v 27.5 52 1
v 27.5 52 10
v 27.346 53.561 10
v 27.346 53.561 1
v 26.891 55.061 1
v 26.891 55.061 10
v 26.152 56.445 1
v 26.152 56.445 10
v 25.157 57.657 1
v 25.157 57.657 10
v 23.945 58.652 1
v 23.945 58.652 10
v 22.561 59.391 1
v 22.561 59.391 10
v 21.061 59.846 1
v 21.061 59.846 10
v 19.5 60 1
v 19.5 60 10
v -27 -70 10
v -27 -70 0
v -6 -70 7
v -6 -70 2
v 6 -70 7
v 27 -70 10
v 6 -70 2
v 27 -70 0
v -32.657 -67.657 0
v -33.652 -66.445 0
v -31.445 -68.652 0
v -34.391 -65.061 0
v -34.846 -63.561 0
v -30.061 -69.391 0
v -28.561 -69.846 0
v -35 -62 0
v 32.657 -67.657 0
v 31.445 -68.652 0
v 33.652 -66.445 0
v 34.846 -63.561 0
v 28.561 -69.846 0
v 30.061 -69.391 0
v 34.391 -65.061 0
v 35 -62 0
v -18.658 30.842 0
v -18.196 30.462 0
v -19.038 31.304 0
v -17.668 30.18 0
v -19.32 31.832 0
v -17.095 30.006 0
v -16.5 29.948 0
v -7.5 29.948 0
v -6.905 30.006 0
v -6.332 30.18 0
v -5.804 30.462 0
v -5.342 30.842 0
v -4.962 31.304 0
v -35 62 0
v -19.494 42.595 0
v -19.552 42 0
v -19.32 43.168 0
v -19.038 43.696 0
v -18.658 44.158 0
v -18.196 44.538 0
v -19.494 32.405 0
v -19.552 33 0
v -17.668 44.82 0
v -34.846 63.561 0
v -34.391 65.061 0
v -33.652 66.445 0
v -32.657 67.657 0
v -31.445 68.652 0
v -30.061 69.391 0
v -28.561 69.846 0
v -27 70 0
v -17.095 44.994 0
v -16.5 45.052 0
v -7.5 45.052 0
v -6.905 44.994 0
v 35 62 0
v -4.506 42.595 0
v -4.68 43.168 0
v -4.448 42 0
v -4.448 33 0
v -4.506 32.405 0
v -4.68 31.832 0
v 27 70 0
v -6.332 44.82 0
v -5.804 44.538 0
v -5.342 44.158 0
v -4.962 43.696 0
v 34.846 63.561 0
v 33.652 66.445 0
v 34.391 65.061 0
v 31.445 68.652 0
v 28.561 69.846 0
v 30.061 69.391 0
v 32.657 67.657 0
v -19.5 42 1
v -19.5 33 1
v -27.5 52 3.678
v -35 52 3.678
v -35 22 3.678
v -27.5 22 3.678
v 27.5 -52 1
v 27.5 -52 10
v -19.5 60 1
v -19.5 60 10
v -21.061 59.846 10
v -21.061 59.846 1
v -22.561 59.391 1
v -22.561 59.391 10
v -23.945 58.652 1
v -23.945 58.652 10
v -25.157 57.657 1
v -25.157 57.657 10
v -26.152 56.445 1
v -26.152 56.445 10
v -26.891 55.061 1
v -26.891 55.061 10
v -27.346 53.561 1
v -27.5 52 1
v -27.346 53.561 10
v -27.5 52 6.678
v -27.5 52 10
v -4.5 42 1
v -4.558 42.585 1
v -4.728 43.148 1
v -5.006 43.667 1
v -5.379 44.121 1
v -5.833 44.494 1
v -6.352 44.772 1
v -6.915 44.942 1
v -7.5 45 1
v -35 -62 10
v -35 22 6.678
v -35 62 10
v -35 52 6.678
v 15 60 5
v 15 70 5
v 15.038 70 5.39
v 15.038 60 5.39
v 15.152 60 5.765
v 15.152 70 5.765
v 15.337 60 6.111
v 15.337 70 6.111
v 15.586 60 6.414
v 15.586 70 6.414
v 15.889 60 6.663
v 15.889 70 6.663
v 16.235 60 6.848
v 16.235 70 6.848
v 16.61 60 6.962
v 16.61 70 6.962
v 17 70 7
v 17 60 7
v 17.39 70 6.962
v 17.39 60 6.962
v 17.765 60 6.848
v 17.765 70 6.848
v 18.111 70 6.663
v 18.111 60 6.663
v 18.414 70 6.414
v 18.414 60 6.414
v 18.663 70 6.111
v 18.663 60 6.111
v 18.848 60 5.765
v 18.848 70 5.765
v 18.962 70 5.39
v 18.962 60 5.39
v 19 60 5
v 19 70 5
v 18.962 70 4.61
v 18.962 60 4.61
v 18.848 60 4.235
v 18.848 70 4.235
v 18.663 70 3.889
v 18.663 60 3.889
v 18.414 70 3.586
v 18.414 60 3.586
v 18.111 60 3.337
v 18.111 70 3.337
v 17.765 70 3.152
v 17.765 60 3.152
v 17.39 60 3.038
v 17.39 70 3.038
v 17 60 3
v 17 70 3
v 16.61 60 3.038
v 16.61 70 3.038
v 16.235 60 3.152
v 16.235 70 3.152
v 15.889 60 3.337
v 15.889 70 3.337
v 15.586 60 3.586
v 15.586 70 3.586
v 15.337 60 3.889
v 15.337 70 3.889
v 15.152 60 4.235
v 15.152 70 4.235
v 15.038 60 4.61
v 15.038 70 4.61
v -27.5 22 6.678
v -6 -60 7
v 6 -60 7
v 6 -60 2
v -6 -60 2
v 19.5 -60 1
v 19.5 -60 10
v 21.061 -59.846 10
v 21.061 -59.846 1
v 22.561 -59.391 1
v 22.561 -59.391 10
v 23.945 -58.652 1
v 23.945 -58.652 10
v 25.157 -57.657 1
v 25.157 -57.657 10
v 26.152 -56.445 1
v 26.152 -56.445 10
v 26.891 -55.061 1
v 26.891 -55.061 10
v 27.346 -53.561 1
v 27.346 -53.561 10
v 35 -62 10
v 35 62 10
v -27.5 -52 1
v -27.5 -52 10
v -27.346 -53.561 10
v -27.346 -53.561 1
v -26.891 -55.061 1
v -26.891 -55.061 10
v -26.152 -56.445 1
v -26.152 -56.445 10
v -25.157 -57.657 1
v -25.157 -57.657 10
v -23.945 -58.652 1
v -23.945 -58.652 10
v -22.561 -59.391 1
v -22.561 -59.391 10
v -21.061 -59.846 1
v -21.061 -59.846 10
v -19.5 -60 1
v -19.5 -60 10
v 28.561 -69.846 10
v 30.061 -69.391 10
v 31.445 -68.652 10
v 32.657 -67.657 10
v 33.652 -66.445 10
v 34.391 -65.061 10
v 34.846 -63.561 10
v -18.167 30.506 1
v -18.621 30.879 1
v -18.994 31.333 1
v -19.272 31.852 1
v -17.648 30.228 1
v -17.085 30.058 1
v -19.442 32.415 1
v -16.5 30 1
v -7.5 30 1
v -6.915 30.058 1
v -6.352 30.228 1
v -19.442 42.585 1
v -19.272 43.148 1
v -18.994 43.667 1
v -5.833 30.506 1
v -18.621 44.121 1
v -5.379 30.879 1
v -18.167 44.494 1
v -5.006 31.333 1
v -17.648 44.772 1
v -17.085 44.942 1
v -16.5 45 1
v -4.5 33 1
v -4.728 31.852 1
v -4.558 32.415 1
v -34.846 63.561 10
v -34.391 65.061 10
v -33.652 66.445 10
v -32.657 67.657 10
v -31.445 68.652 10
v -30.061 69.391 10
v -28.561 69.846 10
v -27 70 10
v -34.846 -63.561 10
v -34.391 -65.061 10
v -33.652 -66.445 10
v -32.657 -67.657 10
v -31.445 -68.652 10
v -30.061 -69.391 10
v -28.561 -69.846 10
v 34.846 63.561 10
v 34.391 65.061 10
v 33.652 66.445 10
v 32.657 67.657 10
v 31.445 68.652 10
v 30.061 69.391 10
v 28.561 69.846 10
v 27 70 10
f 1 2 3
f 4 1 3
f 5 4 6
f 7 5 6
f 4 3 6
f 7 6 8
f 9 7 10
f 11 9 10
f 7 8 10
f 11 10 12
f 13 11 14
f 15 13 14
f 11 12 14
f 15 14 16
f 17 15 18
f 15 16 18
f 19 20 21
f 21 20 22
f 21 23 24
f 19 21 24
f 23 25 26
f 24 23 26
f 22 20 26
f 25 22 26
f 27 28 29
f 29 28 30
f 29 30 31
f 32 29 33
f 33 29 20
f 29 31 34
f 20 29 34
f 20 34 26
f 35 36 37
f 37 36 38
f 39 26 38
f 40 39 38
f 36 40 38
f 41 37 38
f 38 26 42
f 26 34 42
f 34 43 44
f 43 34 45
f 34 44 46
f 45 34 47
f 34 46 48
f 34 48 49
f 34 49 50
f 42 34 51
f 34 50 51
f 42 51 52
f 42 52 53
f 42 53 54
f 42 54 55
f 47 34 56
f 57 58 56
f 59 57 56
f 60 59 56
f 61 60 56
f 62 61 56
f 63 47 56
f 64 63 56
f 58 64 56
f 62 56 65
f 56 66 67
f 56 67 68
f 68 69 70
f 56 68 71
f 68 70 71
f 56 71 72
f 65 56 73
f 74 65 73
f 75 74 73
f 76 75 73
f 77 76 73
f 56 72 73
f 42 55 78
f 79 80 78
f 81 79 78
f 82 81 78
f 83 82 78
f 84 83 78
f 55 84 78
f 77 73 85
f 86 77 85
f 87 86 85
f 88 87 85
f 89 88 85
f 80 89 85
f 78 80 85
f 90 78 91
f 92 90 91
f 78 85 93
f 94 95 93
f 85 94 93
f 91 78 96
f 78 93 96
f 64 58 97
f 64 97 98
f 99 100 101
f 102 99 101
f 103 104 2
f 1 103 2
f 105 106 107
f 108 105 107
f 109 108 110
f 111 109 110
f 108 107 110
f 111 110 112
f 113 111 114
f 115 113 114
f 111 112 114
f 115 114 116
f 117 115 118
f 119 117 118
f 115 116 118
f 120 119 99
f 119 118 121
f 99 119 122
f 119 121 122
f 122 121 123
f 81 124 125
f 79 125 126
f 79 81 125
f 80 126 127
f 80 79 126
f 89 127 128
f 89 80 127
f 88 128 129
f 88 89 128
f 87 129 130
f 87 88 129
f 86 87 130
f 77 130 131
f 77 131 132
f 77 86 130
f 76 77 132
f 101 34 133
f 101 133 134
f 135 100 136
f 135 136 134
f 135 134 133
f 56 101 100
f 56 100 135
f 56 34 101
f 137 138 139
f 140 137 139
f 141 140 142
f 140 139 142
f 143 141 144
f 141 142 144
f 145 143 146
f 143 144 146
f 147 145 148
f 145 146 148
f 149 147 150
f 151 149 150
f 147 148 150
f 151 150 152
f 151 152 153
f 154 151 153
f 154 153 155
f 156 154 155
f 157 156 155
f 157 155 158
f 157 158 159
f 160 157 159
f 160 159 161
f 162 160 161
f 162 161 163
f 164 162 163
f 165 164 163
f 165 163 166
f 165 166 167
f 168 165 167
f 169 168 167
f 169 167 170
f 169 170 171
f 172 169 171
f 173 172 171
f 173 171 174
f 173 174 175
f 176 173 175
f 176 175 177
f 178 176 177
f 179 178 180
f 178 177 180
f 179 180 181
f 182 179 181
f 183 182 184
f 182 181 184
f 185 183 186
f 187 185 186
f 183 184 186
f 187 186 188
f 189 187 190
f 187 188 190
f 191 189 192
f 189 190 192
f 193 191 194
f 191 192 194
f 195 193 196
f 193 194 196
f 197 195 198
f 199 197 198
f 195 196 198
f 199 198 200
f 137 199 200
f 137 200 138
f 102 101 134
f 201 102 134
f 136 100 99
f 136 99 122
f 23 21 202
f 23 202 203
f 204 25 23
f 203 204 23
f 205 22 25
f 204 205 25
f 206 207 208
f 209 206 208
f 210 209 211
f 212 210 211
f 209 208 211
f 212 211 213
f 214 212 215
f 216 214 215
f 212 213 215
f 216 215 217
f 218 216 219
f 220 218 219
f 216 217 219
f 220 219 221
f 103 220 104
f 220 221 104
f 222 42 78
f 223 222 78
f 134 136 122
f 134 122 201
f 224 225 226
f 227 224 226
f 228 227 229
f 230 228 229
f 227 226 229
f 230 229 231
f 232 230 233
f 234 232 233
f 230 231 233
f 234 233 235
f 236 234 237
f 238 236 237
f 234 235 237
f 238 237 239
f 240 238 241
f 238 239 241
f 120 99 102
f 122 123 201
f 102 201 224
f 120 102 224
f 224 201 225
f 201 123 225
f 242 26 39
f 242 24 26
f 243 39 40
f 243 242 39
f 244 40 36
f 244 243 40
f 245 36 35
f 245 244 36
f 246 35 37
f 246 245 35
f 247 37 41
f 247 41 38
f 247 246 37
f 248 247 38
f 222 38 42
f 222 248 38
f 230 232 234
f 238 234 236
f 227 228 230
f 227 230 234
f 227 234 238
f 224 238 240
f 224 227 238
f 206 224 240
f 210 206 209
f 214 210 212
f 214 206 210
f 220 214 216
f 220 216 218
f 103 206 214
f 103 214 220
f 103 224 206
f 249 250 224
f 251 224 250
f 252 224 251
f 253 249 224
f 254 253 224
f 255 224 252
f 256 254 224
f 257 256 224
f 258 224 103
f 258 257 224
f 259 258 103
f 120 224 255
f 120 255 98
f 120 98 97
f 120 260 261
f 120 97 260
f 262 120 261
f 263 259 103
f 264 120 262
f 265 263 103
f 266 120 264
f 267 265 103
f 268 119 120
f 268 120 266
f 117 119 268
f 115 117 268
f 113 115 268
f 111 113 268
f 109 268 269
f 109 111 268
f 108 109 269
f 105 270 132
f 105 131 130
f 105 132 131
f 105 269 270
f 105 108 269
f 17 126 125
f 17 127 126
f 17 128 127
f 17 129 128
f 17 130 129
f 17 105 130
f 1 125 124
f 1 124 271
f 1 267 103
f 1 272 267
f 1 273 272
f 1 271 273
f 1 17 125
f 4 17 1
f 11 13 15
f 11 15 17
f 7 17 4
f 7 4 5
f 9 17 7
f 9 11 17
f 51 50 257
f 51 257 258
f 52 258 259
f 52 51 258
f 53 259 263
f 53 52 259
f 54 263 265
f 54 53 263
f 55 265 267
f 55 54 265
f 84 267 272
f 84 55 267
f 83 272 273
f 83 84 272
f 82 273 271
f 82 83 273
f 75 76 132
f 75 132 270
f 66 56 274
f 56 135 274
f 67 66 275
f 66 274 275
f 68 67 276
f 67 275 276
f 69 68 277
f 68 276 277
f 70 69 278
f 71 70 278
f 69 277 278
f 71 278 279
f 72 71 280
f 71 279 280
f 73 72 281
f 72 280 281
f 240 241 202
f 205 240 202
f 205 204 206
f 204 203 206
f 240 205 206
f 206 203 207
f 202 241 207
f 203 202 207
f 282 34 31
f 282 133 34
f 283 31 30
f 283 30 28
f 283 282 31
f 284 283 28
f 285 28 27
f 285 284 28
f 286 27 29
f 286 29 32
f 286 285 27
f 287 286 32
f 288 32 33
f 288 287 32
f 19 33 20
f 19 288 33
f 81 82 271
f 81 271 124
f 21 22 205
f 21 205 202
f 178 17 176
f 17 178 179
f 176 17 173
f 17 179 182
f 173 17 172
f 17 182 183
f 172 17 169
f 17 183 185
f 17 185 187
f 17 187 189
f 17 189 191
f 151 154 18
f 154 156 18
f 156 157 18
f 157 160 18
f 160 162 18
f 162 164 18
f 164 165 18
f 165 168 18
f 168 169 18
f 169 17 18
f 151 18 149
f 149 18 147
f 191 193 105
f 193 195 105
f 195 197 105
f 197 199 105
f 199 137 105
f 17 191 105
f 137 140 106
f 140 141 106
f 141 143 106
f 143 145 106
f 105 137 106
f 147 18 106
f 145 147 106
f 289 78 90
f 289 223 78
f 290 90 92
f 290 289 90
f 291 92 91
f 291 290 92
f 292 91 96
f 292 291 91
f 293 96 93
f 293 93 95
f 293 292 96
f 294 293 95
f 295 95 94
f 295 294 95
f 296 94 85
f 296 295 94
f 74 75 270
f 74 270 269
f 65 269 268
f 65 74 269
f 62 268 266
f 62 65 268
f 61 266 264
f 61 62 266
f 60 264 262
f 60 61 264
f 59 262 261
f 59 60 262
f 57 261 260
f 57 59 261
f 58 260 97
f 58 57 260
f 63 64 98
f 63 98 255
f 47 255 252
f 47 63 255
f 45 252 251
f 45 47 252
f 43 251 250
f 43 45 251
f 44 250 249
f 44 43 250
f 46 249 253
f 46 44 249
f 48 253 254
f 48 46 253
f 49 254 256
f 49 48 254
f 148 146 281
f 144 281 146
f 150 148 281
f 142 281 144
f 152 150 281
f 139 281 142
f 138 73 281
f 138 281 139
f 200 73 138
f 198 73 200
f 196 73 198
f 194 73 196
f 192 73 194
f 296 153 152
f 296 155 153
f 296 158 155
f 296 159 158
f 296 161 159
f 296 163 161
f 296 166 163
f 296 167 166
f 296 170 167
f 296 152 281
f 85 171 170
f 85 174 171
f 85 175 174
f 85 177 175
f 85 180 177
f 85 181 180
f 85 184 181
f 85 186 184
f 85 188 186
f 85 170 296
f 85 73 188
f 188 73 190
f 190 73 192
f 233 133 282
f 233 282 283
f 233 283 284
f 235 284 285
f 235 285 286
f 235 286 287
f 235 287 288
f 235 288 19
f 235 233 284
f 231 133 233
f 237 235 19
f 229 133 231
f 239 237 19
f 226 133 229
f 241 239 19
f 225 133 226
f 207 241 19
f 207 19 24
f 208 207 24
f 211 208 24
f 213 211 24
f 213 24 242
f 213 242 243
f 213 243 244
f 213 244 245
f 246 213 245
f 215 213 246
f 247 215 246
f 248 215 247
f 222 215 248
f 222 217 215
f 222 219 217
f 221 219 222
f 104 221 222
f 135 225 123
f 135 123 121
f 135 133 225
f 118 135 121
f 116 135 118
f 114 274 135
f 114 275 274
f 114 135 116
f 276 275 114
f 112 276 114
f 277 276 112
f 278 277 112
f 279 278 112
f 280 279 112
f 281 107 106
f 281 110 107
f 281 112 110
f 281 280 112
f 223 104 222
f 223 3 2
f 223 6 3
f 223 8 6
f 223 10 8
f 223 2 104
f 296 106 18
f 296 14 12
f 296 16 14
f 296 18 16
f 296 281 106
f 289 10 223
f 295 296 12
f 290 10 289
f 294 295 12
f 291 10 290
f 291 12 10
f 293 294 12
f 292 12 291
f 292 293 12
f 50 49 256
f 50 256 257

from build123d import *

# Parameters (mm, degrees)
F0_W      = 70
F0_H      = 140
F1_DEPTH  = 10
F3_R      = 8
F4_DEPTH  = 9
F6_DEPTH  = 1.001
F6_TAPER  = -3
F8_W      = 30
F8_H      = 3
F9_DEPTH  = 7.5
F10_R     = 2
F11_DEPTH = 25
F7_W      = 12
F7_H      = 5
F12_DEPTH = 10


with BuildPart() as f1:
    # F0 (on Top) → F1 (new body)
    with BuildSketch(Plane.XY):
        Rectangle(F0_W, F0_H)
    extrude(amount=F1_DEPTH)

    # F3
    f3_edges = [f1.edges().sort_by_distance(p)[0] for p in [
        (35, 70, 5),
        (-35, 70, 5),
        (35, -70, 5),
        (-35, -70, 5),
    ]]
    fillet(f3_edges, radius=F3_R)

    # F2 (on face) → F4 (cut)
    with BuildSketch(Plane.XY.offset(10)):
        with BuildLine():
            Line((19.5, 60), (-19.5, 60))
            ThreePointArc((-19.5, 60), (-25.1568542495, 57.6568542495), (-27.5, 52))
            Line((-27.5, 52), (-27.5, -52))
            ThreePointArc((-27.5, -52), (-25.1568542495, -57.6568542495), (-19.5, -60))
            Line((-19.5, -60), (19.5, -60))
            ThreePointArc((19.5, -60), (25.1568542495, -57.6568542495), (27.5, -52))
            Line((27.5, -52), (27.5, 52))
            ThreePointArc((27.5, 52), (25.1568542495, 57.6568542495), (19.5, 60))
        make_face()
    extrude(amount=-F4_DEPTH, mode=Mode.SUBTRACT)

    # F5 (on face) → F6 (cut, through all)
    with BuildSketch(Plane.XY.offset(1)):
        with BuildLine():
            Line((-7.5, 45), (-16.5, 45))
            ThreePointArc((-16.5, 45), (-18.6213203436, 44.1213203436), (-19.5, 42))
            Line((-19.5, 42), (-19.5, 33))
            ThreePointArc((-19.5, 33), (-18.6213203436, 30.8786796564), (-16.5, 30))
            Line((-16.5, 30), (-7.5, 30))
            ThreePointArc((-7.5, 30), (-5.3786796564, 30.8786796564), (-4.5, 33))
            Line((-4.5, 33), (-4.5, 42))
            ThreePointArc((-4.5, 42), (-5.3786796564, 44.1213203436), (-7.5, 45))
        make_face()
    extrude(amount=-F6_DEPTH, taper=F6_TAPER, mode=Mode.SUBTRACT)

    # F8 (on face) → F9 (cut, through all)
    with BuildSketch(Plane(origin=(-35, 0, 0), x_dir=(0, -1, 0), z_dir=(-1, 0, 0))):
        with Locations((-37, 5.1784133364)):
            Rectangle(F8_W, F8_H)
    extrude(amount=-F9_DEPTH, mode=Mode.SUBTRACT)

    # F10 (on face) → F11 (cut)
    with BuildSketch(Plane(origin=(0, 70, 0), x_dir=(-1, 0, 0), z_dir=(0, 1, 0))):
        with Locations((-17, 5)):
            Circle(F10_R)
    extrude(amount=-F11_DEPTH, mode=Mode.SUBTRACT)

    # F7 (on face) → F12 (cut, through all)
    with BuildSketch(Plane.XZ.offset(70)):
        with Locations((0, 4.5)):
            Rectangle(F7_W, F7_H)
    extrude(amount=-F12_DEPTH, mode=Mode.SUBTRACT)


solid = f1.part
